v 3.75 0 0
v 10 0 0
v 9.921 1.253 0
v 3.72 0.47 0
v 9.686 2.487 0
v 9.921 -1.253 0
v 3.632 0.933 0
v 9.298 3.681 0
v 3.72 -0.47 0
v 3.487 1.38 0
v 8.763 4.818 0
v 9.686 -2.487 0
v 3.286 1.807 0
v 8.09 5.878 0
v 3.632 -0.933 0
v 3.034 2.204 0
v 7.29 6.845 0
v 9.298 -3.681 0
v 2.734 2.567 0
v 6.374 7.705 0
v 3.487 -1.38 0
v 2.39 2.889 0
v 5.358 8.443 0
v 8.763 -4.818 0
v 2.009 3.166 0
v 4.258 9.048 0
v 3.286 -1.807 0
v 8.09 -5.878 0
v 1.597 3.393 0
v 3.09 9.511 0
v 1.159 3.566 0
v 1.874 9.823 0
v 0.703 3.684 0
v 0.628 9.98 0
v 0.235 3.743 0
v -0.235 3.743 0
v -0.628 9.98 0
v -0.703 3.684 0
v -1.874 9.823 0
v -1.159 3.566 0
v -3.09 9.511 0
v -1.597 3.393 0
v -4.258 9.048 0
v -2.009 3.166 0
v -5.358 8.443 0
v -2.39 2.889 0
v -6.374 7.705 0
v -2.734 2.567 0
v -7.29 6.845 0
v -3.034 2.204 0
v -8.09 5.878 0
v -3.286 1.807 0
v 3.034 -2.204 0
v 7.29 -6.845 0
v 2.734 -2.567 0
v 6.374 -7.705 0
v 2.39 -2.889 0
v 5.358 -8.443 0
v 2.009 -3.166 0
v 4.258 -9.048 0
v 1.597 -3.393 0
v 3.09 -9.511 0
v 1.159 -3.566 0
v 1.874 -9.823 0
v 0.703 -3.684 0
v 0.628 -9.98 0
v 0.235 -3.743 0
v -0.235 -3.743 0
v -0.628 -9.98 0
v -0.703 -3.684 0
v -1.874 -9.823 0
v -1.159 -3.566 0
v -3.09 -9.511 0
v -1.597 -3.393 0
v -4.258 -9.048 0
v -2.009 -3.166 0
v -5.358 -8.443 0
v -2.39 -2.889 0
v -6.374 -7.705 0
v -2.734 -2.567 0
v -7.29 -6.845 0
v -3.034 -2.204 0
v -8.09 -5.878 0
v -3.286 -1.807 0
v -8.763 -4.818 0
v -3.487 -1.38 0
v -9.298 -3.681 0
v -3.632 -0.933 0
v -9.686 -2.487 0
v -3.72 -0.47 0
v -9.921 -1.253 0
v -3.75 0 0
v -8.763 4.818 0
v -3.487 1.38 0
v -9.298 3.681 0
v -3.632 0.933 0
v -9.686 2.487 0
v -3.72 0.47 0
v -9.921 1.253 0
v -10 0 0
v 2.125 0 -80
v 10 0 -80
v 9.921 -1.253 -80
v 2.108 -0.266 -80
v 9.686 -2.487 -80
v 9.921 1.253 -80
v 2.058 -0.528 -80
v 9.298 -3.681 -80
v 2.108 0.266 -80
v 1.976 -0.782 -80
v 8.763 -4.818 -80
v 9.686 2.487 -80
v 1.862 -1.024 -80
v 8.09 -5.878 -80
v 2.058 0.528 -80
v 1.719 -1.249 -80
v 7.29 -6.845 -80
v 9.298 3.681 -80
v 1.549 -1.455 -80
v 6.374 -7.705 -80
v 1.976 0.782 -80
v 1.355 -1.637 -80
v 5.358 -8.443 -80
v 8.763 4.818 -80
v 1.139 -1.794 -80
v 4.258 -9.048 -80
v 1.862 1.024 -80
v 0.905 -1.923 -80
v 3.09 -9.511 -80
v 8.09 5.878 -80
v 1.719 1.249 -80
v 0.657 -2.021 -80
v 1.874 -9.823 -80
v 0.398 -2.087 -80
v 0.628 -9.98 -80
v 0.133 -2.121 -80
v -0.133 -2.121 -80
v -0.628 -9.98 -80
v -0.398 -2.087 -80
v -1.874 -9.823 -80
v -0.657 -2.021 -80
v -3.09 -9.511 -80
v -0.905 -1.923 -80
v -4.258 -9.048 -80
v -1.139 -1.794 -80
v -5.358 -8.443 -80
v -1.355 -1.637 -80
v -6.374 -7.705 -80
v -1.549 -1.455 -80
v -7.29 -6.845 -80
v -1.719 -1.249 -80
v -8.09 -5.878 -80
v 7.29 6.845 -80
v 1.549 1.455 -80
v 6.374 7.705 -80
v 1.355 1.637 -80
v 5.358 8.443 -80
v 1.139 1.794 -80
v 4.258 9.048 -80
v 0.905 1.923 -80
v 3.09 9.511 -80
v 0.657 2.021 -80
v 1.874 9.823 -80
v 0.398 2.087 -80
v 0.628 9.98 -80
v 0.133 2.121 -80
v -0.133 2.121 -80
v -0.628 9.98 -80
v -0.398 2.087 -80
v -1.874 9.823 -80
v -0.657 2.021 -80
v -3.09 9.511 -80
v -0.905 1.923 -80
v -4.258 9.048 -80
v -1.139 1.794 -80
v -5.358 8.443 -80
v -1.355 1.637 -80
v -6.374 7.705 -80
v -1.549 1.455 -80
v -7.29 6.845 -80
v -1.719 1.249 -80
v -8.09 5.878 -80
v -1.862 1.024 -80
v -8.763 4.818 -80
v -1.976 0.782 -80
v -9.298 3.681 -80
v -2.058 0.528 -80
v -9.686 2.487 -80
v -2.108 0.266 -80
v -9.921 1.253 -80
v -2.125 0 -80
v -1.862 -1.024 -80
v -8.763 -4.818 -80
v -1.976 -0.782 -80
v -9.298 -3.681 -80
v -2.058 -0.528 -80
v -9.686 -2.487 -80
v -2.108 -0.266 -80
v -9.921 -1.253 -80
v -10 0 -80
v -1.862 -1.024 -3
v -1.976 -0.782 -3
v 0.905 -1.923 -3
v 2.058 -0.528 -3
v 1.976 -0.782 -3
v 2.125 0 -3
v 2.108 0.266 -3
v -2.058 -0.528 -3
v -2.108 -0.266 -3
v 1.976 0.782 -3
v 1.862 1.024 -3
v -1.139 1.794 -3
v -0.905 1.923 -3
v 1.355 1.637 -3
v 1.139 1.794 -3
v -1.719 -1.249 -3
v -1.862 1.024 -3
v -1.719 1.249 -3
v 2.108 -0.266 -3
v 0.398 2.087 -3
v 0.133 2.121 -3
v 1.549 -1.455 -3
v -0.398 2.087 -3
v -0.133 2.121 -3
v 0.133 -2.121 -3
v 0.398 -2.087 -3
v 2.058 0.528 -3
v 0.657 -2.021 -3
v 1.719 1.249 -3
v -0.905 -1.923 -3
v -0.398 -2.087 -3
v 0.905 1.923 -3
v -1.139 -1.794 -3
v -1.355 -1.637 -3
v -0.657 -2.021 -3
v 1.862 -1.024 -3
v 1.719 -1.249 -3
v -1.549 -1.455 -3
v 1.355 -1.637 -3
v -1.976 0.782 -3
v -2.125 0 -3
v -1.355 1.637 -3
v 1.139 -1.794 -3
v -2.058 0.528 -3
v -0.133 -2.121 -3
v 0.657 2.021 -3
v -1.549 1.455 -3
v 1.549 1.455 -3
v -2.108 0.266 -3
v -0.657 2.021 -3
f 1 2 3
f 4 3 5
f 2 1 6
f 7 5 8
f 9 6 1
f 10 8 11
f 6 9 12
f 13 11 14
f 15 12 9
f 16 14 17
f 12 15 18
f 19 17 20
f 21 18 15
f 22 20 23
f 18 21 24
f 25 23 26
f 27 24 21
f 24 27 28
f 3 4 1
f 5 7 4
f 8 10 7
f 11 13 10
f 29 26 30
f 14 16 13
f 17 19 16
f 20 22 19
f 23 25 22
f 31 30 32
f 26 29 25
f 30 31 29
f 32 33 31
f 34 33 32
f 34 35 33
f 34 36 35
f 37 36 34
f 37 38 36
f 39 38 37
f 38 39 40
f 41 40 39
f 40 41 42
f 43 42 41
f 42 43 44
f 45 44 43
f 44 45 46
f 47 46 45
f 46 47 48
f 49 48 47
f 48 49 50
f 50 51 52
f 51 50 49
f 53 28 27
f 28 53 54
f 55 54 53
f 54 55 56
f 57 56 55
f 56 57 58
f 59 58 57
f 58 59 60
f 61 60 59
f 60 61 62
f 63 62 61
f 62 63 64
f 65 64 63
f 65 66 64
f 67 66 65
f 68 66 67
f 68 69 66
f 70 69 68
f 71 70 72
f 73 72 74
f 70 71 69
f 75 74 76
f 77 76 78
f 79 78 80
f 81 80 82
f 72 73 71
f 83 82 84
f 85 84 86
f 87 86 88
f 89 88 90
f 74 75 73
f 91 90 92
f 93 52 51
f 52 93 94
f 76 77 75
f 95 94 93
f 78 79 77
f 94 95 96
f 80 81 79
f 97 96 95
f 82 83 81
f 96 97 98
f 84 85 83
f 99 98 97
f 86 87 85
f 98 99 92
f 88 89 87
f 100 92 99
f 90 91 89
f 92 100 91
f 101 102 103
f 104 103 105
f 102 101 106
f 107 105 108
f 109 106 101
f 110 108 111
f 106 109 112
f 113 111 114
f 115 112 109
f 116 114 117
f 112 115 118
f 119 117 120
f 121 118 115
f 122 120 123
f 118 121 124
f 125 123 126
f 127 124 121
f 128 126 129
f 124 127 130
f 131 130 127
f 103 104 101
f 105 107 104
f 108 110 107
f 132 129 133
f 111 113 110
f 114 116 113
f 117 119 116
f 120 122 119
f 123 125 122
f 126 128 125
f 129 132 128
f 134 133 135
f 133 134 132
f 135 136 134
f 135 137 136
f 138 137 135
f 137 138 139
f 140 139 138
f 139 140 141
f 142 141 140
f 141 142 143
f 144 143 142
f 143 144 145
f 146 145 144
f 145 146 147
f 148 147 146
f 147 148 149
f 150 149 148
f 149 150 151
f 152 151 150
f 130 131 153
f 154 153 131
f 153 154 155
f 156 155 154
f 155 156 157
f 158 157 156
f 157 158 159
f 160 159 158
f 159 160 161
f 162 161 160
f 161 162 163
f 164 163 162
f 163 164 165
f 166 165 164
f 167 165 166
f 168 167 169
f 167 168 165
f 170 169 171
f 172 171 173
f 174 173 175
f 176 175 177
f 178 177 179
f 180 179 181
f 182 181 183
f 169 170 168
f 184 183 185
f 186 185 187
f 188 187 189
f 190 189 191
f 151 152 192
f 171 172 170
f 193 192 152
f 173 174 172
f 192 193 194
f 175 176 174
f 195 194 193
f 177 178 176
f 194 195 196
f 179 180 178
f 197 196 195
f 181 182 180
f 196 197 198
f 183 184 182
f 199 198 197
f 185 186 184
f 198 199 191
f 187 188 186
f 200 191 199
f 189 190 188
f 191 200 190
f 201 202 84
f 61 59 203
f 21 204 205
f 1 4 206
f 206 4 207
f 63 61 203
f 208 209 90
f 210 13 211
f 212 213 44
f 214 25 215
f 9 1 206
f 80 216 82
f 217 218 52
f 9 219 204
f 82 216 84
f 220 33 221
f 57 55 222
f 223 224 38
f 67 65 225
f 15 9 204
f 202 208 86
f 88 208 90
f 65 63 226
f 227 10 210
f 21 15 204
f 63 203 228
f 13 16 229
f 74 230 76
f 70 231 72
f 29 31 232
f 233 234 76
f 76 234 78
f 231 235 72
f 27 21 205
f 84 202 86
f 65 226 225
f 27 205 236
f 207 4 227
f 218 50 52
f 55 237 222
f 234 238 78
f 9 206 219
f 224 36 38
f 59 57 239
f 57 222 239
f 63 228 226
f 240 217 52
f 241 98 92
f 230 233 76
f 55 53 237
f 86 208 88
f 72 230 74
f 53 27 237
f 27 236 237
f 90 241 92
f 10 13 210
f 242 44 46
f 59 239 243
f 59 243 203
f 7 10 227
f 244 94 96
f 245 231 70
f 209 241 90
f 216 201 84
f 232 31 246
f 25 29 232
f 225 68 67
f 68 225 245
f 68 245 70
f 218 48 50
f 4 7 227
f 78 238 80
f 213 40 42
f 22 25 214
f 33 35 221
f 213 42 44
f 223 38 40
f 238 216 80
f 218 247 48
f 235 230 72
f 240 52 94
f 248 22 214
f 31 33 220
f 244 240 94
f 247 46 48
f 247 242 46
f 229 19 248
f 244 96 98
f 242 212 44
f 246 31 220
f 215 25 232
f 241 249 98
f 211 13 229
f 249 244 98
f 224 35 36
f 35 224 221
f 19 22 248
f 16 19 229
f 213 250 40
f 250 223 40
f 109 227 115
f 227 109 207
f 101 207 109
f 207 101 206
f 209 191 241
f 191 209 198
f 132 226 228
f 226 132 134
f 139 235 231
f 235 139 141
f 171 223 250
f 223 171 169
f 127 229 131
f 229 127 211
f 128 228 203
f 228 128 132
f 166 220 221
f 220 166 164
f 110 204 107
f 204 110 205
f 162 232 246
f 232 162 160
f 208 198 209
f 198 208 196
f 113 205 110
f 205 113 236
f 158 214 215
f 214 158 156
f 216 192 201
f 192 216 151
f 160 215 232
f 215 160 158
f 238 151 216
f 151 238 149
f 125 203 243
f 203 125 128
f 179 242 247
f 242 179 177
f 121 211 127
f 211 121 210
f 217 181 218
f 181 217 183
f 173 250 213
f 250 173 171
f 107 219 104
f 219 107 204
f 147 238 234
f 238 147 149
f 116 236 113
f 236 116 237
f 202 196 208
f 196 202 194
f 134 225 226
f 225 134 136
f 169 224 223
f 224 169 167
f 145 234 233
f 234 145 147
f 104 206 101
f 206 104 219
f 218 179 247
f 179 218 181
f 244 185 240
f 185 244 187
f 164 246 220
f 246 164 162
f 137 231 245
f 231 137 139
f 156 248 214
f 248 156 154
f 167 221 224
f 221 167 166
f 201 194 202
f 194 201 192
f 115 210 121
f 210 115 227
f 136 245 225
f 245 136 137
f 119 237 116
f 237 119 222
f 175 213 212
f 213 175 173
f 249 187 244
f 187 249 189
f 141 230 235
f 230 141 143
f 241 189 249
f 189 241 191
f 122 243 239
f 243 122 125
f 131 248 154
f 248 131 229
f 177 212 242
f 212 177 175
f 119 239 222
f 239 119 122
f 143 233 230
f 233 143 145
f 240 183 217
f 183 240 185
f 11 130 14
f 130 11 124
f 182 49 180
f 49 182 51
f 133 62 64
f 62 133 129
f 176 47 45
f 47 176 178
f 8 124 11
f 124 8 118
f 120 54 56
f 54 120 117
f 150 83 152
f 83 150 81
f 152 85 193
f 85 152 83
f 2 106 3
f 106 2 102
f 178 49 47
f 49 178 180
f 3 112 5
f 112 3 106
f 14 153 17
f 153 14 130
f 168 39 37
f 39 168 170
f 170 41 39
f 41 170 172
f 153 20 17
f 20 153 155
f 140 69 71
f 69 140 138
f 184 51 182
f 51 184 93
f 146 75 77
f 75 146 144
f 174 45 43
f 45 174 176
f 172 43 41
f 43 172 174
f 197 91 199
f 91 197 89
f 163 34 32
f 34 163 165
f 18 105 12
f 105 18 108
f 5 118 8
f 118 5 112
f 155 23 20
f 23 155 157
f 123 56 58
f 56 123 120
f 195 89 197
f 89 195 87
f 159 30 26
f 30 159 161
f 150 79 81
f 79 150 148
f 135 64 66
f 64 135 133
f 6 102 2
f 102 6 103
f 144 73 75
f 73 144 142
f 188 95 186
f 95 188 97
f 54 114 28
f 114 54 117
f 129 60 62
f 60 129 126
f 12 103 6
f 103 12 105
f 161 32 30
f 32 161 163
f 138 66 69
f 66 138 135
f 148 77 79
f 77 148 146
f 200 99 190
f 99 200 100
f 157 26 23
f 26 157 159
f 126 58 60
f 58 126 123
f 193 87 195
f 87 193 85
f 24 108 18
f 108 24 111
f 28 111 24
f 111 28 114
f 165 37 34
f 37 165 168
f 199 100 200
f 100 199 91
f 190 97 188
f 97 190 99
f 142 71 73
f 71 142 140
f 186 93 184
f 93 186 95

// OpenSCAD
$fn = 50;


difference() {
	union() {
		translate(v = [0, 0, -80.0000000000]) {
			cylinder(h = 80, r = 10.0000000000);
		}
		cylinder(h = 0, r = 20.0000000000);
	}
	union() {
		translate(v = [0, 0, 0]) {
			rotate(a = [0, 0, 0]) {
				difference() {
					union() {
						#translate(v = [0, 0, -80.0000000000]) {
							cylinder(h = 80, r = 2.0000000000);
						}
						#translate(v = [0, 0, -3]) {
							cylinder(h = 3, r = 10.0000000000, r1 = 2.1250000000, r2 = 3.7500000000);
						}
						#translate(v = [0, 0, -80.0000000000]) {
							cylinder(h = 80, r = 2.1250000000);
						}
						#translate(v = [0, 0, -80.0000000000]) {
							cylinder(h = 80, r = 2.0000000000);
						}
					}
					union();
				}
			}
		}
	}
}
